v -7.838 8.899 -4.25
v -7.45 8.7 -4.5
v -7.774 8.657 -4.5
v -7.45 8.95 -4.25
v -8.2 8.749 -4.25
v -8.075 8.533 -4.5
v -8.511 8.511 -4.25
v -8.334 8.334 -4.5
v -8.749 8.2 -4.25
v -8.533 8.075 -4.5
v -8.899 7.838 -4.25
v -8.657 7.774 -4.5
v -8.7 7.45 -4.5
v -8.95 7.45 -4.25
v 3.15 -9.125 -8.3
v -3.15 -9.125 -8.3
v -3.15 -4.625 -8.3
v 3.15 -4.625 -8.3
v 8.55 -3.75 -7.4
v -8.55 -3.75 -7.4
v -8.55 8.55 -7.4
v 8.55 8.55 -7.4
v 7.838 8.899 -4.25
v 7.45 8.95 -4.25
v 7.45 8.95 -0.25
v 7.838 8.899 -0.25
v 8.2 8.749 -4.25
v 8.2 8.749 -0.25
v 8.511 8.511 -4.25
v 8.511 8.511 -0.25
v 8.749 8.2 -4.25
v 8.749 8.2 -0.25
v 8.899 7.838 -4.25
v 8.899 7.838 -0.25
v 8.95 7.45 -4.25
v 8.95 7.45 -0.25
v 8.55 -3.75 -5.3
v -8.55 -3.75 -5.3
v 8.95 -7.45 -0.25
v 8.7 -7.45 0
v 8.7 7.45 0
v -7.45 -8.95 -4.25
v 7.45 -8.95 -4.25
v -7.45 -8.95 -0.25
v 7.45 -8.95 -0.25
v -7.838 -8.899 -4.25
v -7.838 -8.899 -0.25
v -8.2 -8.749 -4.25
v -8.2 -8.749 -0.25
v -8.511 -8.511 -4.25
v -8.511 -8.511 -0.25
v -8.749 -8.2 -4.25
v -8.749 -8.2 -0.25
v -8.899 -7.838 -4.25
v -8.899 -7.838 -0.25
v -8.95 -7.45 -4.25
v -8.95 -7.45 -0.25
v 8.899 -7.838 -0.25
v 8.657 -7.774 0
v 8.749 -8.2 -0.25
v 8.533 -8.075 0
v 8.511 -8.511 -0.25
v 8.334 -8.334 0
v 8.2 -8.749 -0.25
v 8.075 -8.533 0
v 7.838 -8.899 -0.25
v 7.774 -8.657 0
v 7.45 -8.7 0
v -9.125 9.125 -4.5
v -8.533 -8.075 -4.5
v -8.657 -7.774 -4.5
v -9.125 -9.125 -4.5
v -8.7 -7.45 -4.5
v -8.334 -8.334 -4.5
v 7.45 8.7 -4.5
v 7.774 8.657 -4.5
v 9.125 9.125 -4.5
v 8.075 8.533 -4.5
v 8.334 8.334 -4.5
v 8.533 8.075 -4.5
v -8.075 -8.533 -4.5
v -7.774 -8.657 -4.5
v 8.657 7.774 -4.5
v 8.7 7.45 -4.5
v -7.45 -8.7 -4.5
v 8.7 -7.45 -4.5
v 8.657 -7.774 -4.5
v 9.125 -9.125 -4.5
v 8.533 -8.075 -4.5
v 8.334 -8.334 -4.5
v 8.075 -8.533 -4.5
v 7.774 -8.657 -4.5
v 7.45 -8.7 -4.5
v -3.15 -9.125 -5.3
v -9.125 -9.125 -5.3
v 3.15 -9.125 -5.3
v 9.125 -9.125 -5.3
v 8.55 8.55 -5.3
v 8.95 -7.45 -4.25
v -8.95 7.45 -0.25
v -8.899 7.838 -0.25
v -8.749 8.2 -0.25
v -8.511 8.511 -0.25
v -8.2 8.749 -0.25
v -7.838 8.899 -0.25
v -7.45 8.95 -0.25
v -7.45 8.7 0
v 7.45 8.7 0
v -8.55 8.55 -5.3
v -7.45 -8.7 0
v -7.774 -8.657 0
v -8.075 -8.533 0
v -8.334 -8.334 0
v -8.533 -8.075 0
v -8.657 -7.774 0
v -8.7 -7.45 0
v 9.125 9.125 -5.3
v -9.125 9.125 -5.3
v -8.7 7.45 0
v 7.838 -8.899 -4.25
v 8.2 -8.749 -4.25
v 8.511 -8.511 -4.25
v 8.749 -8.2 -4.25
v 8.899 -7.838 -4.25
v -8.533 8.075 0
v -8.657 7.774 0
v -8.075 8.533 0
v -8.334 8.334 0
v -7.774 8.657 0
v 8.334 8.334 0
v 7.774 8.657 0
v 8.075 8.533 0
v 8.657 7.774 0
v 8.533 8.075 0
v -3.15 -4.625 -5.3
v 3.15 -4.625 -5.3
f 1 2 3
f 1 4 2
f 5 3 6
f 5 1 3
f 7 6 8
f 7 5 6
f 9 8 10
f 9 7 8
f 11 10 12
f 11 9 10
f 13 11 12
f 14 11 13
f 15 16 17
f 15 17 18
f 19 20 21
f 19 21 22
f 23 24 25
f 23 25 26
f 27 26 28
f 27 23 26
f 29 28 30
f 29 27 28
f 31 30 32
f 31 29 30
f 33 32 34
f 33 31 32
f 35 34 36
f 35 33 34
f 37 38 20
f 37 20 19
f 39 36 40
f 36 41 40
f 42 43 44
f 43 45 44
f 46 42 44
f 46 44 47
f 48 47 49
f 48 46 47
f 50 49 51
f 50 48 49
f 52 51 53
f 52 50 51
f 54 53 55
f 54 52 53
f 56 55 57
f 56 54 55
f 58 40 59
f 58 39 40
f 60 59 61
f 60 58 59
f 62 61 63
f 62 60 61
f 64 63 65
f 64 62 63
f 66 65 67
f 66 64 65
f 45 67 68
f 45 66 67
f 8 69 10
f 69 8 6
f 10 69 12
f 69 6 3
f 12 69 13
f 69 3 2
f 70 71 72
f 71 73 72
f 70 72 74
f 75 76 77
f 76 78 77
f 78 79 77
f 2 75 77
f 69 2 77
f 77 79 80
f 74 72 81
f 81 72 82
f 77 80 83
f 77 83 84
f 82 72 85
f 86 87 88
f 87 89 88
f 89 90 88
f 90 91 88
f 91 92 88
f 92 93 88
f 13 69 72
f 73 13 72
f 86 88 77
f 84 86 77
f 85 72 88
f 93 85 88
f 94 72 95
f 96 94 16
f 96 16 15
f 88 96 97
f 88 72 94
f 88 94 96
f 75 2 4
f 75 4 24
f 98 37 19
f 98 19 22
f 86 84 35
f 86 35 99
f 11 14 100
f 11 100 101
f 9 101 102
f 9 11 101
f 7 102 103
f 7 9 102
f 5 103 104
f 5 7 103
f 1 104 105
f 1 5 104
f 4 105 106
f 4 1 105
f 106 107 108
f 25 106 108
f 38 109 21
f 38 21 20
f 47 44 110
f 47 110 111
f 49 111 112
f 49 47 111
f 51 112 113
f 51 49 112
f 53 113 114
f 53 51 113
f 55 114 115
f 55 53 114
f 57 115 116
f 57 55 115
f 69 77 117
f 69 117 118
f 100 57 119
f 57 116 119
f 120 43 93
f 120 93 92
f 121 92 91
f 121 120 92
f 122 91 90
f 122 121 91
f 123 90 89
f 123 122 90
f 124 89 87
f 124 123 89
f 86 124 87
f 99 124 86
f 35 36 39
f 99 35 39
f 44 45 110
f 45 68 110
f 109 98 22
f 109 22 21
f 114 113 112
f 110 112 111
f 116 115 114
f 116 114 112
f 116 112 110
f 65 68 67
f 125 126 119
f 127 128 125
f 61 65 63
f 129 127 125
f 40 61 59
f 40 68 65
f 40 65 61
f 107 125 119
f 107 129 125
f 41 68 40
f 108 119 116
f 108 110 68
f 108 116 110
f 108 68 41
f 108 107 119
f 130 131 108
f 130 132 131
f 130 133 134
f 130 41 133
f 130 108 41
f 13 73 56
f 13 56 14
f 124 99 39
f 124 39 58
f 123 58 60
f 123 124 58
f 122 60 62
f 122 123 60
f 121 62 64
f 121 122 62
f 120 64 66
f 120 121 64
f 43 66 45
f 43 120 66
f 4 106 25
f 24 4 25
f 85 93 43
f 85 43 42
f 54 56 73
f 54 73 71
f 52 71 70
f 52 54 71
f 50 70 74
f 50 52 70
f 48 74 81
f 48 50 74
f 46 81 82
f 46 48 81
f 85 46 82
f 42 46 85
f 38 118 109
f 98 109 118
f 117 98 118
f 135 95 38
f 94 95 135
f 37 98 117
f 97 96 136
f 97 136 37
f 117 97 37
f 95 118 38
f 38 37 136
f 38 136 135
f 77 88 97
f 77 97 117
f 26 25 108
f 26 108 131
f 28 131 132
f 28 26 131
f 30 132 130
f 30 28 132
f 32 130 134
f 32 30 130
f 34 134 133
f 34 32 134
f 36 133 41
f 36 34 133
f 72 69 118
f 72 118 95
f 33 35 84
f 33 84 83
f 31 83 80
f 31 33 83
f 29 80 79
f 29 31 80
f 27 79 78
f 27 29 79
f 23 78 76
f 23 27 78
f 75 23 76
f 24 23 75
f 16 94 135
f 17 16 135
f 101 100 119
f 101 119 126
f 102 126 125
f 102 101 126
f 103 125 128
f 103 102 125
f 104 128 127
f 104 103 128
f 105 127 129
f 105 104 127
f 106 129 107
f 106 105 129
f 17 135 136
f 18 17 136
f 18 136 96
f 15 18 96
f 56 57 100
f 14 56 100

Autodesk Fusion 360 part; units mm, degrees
sketch "Sketch1" plane through (0, 0, 0) normal (0, 0, 1) x (1, 0, 0)
  line L0 (-8.95, 8.95) -> (8.95, 8.95)
  line L1 (8.95, 8.95) -> (8.95, -8.95)
  line L2 (8.95, -8.95) -> (-8.95, -8.95)
  line L3 (-8.95, -8.95) -> (-8.95, 8.95)
  line L4 (-8.95, 8.95) -> (8.95, -8.95) construction
  line L5 (8.95, 8.95) -> (-8.95, -8.95) construction
  dimension "d1" = 17.9
extrude "Extrude1" add sketch "Sketch1" against normal blind 4.5
fillet "Fillet1" radius 1.5 4 edges at (8.95, -8.95, -2.25) (-8.95, -8.95, -2.25) (-8.95, 8.95, -2.25) (8.95, 8.95, -2.25)
chamfer "Chamfer1" distance 0.25 angle 45 2 faces at (2.4833, -1.9833, 0) (2.4833, -1.9833, -4.5)
sketch "Sketch2" plane through (0, 0, -4.5) normal (0, 0, -1) x (1, 0, 0)
  arc A0 (7.45, -8.7) -> (8.7, -7.45) centre (7.45, -7.45) ccw
  line L0 (8.7, -7.45) -> (8.7, 7.45)
  arc A1 (8.7, 7.45) -> (7.45, 8.7) centre (7.45, 7.45) ccw
  line L1 (7.45, 8.7) -> (-7.45, 8.7)
  arc A2 (-7.45, 8.7) -> (-8.7, 7.45) centre (-7.45, 7.45) ccw
  line L2 (-8.7, 7.45) -> (-8.7, -7.45)
  arc A3 (-8.7, -7.45) -> (-7.45, -8.7) centre (-7.45, -7.45) ccw
  line L3 (-7.45, -8.7) -> (7.45, -8.7)
  line L4 (9.125, -9.125) -> (-9.125, -9.125)
  line L5 (-9.125, -9.125) -> (-9.125, 9.125)
  line L6 (-9.125, 9.125) -> (9.125, 9.125)
  line L7 (9.125, 9.125) -> (9.125, -9.125)
  line L8 (9.125, -9.125) -> (-9.125, 9.125) construction
  line L9 (-9.125, -9.125) -> (9.125, 9.125) construction
  dimension "d7" = 18.25
extrude "Extrude2" add sketch "Sketch2" along normal blind 0.8 contours A0 L0 A1 L1 A2 L2 A3 L3 | L4 L5 L6 L7
sketch "Sketch3" plane through (0, 0, -5.3) normal (0, 0, -1) x (1, 0, 0)
  line L0 (9.125, 9.125) -> (-9.125, 9.125)
  line L1 (-9.125, 9.125) -> (-9.125, -9.125)
  line L2 (-9.125, -9.125) -> (9.125, -9.125)
  line L3 (9.125, -9.125) -> (9.125, 9.125)
  line L4 (-8.55, 8.55) -> (8.55, 8.55)
  line L5 (8.55, 8.55) -> (8.55, -8.55)
  line L6 (8.55, -8.55) -> (-8.55, -8.55)
  line L7 (-8.55, -8.55) -> (-8.55, 8.55)
  line L8 (-8.55, 8.55) -> (8.55, -8.55) construction
  line L9 (8.55, 8.55) -> (-8.55, -8.55) construction
  line L10 (-8.55, 3.75) -> (8.55, 3.75)
  dimension "d10" = 17.1
  dimension "d11" = 12.3
extrude "Extrude3" add sketch "Sketch3" along normal blind 2.1 contours L5 L6 L7 L10
sketch "Sketch4" plane through (0, 0, -5.3) normal (0, 0, -1) x (1, 0, 0)
  line L0 (-8.55, 3.75) -> (8.55, 3.75)
  line L1 (8.55, 3.75) -> (8.55, -8.55)
  line L2 (8.55, -8.55) -> (-8.55, -8.55)
  line L3 (-8.55, -8.55) -> (-8.55, 3.75)
  line L4 (9.125, 9.125) -> (-9.125, 9.125)
  line L5 (-9.125, 9.125) -> (-9.125, -9.125)
  line L6 (-9.125, -9.125) -> (9.125, -9.125)
  line L7 (9.125, -9.125) -> (9.125, 9.125)
  line L8 (3.15, 9.125) -> (-3.15, 9.125)
  line L9 (-3.15, 9.125) -> (-3.15, 4.625)
  line L10 (-3.15, 4.625) -> (3.15, 4.625)
  line L11 (3.15, 4.625) -> (3.15, 9.125)
  point P0 (0, 4.625)
  dimension "d14" = 6.3
  dimension "d15" = 4.5
extrude "Extrude4" add sketch "Sketch4" along normal blind 3 contours L4 L8 L9 L10 L11
